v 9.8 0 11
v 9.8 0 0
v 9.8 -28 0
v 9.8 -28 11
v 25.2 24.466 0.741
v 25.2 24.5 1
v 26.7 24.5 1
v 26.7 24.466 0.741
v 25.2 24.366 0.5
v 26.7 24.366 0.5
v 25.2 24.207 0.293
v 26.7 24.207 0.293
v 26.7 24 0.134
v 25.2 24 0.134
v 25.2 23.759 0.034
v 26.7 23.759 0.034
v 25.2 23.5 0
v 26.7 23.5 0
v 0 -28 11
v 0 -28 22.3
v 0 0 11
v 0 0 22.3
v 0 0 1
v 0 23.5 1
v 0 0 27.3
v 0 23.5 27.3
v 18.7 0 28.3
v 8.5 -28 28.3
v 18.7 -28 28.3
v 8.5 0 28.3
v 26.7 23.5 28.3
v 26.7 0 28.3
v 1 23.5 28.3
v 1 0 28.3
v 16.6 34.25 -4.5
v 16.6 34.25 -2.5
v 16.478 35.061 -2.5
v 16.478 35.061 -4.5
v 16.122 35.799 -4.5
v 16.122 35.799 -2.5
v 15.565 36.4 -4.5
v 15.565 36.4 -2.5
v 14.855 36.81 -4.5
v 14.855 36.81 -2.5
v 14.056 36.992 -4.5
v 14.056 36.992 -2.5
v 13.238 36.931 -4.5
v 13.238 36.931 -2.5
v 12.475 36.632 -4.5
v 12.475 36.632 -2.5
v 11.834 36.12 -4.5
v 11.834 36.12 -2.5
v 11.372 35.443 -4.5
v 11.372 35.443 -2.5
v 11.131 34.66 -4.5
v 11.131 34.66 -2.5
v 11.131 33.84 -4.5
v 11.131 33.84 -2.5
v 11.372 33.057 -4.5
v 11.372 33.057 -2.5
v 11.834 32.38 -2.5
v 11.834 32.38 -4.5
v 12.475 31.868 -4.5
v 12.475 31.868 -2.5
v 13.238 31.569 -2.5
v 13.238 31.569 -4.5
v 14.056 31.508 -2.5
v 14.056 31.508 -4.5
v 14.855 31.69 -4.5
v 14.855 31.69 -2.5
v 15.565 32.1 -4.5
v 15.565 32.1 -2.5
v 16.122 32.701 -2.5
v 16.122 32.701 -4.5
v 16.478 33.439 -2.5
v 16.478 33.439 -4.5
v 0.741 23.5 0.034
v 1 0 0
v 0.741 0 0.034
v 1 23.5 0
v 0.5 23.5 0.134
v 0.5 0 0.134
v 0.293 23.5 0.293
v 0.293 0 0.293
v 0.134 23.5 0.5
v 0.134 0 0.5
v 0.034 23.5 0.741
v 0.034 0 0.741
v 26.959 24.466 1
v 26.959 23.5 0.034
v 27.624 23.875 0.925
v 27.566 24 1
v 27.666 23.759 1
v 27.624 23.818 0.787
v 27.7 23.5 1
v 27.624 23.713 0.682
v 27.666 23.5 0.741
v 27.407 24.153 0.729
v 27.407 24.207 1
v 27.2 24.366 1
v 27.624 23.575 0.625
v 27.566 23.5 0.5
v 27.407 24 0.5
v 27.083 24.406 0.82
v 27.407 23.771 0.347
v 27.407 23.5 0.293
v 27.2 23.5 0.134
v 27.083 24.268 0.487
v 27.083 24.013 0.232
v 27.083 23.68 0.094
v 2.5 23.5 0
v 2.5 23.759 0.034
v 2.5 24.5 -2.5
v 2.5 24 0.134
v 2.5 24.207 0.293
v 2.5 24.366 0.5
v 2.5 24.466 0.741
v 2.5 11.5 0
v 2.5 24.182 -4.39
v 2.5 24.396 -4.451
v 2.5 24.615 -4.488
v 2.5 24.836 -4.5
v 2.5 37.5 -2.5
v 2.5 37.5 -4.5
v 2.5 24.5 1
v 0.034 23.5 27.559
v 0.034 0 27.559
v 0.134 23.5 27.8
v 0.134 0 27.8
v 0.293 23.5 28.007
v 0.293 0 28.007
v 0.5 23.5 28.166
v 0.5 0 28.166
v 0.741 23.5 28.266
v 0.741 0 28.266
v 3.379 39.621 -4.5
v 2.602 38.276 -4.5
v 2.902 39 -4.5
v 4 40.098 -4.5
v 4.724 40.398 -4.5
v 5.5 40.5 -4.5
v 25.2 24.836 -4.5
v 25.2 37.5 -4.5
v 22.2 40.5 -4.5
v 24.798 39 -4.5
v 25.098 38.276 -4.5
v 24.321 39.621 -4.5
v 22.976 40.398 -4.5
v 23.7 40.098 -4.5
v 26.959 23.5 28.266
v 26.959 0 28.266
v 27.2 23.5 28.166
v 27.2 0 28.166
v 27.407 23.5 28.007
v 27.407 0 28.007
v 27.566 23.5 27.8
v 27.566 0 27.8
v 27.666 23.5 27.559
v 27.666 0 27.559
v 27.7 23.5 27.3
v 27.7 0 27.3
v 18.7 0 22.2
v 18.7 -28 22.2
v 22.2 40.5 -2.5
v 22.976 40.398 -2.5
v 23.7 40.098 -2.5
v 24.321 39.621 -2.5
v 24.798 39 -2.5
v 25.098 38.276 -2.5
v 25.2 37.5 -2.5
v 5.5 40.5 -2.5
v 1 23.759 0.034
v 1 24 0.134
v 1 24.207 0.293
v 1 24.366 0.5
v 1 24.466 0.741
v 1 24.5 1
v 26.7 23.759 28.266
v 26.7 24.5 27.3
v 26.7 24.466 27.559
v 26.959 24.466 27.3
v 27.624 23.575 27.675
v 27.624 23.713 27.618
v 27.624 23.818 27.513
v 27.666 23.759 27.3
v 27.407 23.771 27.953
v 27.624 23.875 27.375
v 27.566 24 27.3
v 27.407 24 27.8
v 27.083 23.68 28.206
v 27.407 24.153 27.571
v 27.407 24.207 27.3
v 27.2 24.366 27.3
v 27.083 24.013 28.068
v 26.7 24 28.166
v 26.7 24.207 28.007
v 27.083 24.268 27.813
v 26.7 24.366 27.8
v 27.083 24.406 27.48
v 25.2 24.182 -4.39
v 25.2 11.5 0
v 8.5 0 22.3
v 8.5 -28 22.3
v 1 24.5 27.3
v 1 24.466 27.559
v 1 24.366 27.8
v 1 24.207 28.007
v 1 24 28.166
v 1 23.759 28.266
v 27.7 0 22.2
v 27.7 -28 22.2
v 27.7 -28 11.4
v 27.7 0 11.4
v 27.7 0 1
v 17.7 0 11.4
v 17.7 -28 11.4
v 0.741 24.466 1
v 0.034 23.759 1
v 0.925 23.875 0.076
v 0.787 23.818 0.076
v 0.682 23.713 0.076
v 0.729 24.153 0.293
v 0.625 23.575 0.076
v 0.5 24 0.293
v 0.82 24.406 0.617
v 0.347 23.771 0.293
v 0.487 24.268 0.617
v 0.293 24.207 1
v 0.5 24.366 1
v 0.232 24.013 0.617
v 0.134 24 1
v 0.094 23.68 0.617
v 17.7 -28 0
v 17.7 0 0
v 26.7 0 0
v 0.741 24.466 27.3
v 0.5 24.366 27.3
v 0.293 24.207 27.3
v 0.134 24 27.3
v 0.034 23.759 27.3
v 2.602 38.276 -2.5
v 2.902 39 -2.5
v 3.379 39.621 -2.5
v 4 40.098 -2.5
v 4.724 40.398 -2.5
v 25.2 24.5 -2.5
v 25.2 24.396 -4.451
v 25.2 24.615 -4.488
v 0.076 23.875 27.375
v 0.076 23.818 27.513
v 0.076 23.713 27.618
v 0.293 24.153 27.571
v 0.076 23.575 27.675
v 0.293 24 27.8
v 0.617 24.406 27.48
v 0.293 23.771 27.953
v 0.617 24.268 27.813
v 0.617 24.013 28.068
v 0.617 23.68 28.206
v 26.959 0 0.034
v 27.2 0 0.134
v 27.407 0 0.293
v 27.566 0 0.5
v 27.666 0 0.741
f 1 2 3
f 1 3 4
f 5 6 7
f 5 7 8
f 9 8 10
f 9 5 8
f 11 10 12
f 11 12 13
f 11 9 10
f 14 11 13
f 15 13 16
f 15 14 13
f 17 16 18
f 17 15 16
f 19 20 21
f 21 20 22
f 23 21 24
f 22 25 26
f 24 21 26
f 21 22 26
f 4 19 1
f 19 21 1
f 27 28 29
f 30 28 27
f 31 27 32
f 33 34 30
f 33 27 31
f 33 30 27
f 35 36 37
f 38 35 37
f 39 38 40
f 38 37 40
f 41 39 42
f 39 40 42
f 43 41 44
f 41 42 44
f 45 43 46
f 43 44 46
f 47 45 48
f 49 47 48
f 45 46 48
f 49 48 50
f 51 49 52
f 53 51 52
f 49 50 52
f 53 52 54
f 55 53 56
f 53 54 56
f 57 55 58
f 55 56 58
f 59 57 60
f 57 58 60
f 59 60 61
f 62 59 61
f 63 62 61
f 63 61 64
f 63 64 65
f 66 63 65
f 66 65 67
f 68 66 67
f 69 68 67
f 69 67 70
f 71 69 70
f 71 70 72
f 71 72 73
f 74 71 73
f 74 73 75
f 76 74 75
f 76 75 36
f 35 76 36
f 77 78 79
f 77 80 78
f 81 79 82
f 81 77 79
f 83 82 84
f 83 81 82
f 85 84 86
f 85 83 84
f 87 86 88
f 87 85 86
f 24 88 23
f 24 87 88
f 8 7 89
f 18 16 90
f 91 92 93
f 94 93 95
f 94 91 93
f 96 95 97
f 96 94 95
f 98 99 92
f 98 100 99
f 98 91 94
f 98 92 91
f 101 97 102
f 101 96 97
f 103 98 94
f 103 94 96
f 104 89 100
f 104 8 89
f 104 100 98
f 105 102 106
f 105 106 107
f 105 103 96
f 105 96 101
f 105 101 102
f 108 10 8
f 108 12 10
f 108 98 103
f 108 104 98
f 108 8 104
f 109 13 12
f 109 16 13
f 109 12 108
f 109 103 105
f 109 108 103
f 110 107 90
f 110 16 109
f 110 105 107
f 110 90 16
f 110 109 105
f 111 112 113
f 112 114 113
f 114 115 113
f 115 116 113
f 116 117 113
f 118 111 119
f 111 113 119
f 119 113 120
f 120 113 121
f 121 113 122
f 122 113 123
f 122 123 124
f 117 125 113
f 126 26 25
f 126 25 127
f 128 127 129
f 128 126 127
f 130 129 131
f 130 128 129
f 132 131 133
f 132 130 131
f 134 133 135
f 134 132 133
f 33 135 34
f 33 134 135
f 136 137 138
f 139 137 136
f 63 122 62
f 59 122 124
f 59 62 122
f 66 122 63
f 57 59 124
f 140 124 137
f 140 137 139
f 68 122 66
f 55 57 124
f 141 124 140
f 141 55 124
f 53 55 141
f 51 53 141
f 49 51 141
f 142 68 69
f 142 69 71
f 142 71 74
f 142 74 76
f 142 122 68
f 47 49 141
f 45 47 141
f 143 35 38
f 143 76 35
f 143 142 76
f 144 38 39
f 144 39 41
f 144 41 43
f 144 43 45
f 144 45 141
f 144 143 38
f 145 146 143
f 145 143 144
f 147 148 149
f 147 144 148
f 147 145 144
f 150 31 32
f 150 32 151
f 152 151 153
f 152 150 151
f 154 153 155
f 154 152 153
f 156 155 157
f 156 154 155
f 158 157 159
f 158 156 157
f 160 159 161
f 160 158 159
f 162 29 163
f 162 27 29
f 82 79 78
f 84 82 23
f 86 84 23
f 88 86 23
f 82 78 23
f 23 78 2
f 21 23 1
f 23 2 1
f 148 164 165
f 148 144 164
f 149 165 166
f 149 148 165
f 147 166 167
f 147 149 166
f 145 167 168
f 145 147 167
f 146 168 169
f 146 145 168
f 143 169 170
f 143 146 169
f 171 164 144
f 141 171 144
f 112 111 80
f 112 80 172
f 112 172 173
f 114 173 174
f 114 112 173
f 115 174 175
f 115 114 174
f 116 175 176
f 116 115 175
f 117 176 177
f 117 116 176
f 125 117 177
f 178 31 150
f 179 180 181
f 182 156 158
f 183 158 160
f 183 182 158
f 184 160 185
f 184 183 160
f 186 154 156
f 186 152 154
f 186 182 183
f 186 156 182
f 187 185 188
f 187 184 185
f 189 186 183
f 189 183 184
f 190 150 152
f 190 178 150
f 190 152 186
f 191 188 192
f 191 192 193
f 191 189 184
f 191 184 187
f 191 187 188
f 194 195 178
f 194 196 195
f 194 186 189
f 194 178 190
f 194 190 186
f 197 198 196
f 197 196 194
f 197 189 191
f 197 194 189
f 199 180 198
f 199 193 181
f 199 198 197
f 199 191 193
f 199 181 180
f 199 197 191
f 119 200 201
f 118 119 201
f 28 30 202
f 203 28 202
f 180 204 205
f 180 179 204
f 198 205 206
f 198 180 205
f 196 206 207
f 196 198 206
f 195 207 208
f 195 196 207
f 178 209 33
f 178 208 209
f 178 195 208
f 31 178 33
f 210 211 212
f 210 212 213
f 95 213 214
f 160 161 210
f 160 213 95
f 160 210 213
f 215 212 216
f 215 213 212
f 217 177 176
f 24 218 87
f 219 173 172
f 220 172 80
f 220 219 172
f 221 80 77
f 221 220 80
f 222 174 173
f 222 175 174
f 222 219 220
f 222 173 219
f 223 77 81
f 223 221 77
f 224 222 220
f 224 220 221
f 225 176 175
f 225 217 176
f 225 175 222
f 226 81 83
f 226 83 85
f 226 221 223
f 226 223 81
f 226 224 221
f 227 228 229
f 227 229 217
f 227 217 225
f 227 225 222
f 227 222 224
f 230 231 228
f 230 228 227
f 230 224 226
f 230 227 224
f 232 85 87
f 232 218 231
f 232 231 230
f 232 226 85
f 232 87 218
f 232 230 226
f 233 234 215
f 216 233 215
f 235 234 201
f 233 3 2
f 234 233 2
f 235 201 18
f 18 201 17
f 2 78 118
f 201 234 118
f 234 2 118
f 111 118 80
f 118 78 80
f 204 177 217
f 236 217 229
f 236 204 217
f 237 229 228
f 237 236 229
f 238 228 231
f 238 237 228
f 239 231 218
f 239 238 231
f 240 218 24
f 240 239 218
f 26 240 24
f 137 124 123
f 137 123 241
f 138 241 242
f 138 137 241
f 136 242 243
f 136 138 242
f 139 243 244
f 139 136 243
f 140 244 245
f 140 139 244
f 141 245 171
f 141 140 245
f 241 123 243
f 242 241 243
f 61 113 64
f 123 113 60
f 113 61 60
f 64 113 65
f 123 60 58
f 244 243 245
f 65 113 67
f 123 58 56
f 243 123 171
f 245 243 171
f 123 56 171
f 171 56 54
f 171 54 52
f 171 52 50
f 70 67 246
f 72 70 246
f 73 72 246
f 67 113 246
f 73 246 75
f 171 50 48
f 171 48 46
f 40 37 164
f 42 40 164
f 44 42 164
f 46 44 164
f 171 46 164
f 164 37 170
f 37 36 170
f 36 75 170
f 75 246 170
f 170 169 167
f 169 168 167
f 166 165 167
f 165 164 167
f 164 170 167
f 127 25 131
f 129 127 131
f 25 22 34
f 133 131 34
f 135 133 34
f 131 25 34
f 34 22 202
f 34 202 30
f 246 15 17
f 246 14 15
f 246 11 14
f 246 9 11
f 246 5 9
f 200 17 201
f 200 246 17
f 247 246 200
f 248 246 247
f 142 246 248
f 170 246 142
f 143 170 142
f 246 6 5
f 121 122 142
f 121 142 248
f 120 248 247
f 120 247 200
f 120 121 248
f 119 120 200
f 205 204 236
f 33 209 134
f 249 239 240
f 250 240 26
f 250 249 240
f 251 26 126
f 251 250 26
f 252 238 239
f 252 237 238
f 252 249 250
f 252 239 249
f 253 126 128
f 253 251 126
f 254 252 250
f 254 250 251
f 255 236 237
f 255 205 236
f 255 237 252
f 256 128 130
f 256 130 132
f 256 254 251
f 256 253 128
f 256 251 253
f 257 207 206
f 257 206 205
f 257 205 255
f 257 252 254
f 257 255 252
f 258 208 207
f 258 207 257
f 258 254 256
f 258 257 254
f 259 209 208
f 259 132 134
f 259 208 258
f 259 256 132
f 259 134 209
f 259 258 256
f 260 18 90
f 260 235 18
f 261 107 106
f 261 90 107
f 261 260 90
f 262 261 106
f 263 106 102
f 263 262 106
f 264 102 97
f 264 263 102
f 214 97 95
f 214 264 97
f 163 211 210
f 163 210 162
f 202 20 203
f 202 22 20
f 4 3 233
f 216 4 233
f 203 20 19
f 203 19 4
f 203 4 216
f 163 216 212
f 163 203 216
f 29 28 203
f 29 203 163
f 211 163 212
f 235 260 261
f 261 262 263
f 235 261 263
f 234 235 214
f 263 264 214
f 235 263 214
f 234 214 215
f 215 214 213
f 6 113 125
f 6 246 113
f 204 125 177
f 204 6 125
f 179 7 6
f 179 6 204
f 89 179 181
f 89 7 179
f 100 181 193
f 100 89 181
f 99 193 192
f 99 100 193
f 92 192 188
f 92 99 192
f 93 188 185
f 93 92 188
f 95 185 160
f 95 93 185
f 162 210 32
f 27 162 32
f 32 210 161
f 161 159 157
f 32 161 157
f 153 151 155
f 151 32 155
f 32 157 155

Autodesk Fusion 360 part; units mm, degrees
box "长方体基本要素1" add length 28.3 width 27.7 height 24.5 placed x (0, 0, 1) y (1, 0, 0) z (0, 1, 0) at (0, 0, 0)
sketch "草图2" plane through (27.7, 0, 0) normal (1, 0, 0) x (0, 0, -1)
  line L0 (-28.3, 24.5) -> (-28.3, 0)
  line L1 (-28.3, 0) -> (0, 0)
  line L2 (0, 0) -> (0, 24.5)
  line L3 (0, 24.5) -> (-28.3, 24.5)
  line L4 (0, 24.5) -> (4.5, 24.5)
  line L5 (0, 24.5) -> (0, 11.5)
  line L6 (4.5, 24.5) -> (0, 11.5)
  line L7 (4.5, 24.5) -> (2.5, 24.5)
  line L8 (2.5, 24.5) -> (2.5, 40.5)
  line L9 (4.5, 24.5) -> (4.5, 40.5)
  line L10 (2.5, 40.5) -> (4.5, 40.5)
  dimension "d8" = 4.5
  dimension "d9" = 13
  dimension "d10" = 2
  dimension "d11" = 16
extrude "拉伸3" add sketch "草图2" against normal blind 25.2 contours L2 L4 L5 L6 L7 | L4 L7 L8 L9 L10
extrude "拉伸4" cut sketch "草图2" against normal blind 2.5 contours L2 L4 L5 L6 L7 | L4 L7 L8 L9 L10
fillet "圆角4" radius 1 6 edges at (26.45, 24.5, 0) (13.85, 24.5, 28.3) (0, 12.25, 28.3) (0, 24.5, 14.15) (0, 12.25, 0) (1.25, 24.5, 0)
fillet "圆角5" radius 1 5 edges at (27.7, 11.75, 28.3) (27.7, 24.2071, 28.0071) (27.7, 24.5, 14.15) (27.7, 24.2071, 0.2929) (27.7, 11.75, 0)
fillet "圆角6" radius 3 2 edges at (25.2, 40.5, -3.5) (2.5, 40.5, -3.5)
fillet "圆角7" radius 2 1 edges at (13.85, 24.5, -4.5)
sketch "草图3" plane through (0, 0, -2.5) normal (0, 0, 1) x (1, 0, 0)
  arc A0 (5.5, 40.5) -> (2.5, 37.5) centre (5.5, 37.5) ccw
  line L0 (2.5, 37.5) -> (2.5, 24.5)
  line L1 (2.5, 24.5) -> (25.2, 24.5)
  line L2 (25.2, 24.5) -> (25.2, 37.5)
  arc A1 (25.2, 37.5) -> (22.2, 40.5) centre (22.2, 37.5) ccw
  line L3 (22.2, 40.5) -> (5.5, 40.5)
  line L4 (13.85, 40.5) -> (13.85, 37) construction
  line L5 (13.85, 37) -> (13.85, 34.25) construction
  circle A2 centre (13.85, 34.25) radius 2.75
  point P0 (13.85, 40.5)
  dimension "d34" = 3.5
  dimension "d35" = 2.75
  dimension "d36" = 5.5
extrude "拉伸5" cut sketch "草图3" against normal blind 10 contours A2
sketch "草图4" plane through (0, 0, 0) normal (0, -1, 0) x (1, 0, 0)
  arc A0 (27.7, 27.3) -> (26.7, 28.3) centre (26.7, 27.3) ccw
  line L0 (26.7, 28.3) -> (1, 28.3)
  arc A1 (1, 28.3) -> (0, 27.3) centre (1, 27.3) ccw
  line L1 (0, 27.3) -> (0, 1)
  arc A2 (0, 1) -> (1, 0) centre (1, 1) ccw
  line L2 (1, 0) -> (26.7, 0)
  arc A3 (26.7, 0) -> (27.7, 1) centre (26.7, 1) ccw
  line L3 (27.7, 1) -> (27.7, 27.3)
  line L4 (27.7, 28.3) -> (27.7, 0)
  line L5 (8.5, 28.3) -> (8.5, 22.3)
  line L6 (18.7, 28.3) -> (18.7, 22.2)
  line L7 (27.7, 22.2) -> (18.7, 22.2)
  line L8 (0, 11) -> (9.8, 11)
  line L9 (27.7, 11.4) -> (17.7, 11.4)
  line L10 (17.7, 0) -> (17.7, 11.4)
  line L11 (9.8, 0) -> (9.8, 11)
  line L12 (9.8, 22.2) -> (9.8, 22.3)
  line L13 (0, 22.3) -> (8.5, 22.3)
  point P0 (8.5, 28.3)
  point P1 (18.7, 28.3)
  point P2 (0, 22.3)
  point P3 (0, 11)
  point P4 (9.8, 0)
  point P5 (17.7, 0)
  point P6 (27.7, 11.4)
  point P7 (27.7, 22.2)
  dimension "d39" = 8.5
  dimension "d40" = 9
  dimension "d41" = 6
  dimension "d42" = 11
  dimension "d43" = 9.8
  dimension "d44" = 10
  dimension "d45" = 11.4
  dimension "d46" = 6.1
extrude "拉伸6" add sketch "草图4" along normal blind 28 contours L0 L1 L2 L3 L4 L5 L6 L7 L8 L9 L10 L11 L13
extrude "拉伸1" [suppressed]
fillet "圆角1" [suppressed]
fillet "圆角2" [suppressed]
fillet "圆角3" [suppressed]
extrude "拉伸2" [suppressed]
